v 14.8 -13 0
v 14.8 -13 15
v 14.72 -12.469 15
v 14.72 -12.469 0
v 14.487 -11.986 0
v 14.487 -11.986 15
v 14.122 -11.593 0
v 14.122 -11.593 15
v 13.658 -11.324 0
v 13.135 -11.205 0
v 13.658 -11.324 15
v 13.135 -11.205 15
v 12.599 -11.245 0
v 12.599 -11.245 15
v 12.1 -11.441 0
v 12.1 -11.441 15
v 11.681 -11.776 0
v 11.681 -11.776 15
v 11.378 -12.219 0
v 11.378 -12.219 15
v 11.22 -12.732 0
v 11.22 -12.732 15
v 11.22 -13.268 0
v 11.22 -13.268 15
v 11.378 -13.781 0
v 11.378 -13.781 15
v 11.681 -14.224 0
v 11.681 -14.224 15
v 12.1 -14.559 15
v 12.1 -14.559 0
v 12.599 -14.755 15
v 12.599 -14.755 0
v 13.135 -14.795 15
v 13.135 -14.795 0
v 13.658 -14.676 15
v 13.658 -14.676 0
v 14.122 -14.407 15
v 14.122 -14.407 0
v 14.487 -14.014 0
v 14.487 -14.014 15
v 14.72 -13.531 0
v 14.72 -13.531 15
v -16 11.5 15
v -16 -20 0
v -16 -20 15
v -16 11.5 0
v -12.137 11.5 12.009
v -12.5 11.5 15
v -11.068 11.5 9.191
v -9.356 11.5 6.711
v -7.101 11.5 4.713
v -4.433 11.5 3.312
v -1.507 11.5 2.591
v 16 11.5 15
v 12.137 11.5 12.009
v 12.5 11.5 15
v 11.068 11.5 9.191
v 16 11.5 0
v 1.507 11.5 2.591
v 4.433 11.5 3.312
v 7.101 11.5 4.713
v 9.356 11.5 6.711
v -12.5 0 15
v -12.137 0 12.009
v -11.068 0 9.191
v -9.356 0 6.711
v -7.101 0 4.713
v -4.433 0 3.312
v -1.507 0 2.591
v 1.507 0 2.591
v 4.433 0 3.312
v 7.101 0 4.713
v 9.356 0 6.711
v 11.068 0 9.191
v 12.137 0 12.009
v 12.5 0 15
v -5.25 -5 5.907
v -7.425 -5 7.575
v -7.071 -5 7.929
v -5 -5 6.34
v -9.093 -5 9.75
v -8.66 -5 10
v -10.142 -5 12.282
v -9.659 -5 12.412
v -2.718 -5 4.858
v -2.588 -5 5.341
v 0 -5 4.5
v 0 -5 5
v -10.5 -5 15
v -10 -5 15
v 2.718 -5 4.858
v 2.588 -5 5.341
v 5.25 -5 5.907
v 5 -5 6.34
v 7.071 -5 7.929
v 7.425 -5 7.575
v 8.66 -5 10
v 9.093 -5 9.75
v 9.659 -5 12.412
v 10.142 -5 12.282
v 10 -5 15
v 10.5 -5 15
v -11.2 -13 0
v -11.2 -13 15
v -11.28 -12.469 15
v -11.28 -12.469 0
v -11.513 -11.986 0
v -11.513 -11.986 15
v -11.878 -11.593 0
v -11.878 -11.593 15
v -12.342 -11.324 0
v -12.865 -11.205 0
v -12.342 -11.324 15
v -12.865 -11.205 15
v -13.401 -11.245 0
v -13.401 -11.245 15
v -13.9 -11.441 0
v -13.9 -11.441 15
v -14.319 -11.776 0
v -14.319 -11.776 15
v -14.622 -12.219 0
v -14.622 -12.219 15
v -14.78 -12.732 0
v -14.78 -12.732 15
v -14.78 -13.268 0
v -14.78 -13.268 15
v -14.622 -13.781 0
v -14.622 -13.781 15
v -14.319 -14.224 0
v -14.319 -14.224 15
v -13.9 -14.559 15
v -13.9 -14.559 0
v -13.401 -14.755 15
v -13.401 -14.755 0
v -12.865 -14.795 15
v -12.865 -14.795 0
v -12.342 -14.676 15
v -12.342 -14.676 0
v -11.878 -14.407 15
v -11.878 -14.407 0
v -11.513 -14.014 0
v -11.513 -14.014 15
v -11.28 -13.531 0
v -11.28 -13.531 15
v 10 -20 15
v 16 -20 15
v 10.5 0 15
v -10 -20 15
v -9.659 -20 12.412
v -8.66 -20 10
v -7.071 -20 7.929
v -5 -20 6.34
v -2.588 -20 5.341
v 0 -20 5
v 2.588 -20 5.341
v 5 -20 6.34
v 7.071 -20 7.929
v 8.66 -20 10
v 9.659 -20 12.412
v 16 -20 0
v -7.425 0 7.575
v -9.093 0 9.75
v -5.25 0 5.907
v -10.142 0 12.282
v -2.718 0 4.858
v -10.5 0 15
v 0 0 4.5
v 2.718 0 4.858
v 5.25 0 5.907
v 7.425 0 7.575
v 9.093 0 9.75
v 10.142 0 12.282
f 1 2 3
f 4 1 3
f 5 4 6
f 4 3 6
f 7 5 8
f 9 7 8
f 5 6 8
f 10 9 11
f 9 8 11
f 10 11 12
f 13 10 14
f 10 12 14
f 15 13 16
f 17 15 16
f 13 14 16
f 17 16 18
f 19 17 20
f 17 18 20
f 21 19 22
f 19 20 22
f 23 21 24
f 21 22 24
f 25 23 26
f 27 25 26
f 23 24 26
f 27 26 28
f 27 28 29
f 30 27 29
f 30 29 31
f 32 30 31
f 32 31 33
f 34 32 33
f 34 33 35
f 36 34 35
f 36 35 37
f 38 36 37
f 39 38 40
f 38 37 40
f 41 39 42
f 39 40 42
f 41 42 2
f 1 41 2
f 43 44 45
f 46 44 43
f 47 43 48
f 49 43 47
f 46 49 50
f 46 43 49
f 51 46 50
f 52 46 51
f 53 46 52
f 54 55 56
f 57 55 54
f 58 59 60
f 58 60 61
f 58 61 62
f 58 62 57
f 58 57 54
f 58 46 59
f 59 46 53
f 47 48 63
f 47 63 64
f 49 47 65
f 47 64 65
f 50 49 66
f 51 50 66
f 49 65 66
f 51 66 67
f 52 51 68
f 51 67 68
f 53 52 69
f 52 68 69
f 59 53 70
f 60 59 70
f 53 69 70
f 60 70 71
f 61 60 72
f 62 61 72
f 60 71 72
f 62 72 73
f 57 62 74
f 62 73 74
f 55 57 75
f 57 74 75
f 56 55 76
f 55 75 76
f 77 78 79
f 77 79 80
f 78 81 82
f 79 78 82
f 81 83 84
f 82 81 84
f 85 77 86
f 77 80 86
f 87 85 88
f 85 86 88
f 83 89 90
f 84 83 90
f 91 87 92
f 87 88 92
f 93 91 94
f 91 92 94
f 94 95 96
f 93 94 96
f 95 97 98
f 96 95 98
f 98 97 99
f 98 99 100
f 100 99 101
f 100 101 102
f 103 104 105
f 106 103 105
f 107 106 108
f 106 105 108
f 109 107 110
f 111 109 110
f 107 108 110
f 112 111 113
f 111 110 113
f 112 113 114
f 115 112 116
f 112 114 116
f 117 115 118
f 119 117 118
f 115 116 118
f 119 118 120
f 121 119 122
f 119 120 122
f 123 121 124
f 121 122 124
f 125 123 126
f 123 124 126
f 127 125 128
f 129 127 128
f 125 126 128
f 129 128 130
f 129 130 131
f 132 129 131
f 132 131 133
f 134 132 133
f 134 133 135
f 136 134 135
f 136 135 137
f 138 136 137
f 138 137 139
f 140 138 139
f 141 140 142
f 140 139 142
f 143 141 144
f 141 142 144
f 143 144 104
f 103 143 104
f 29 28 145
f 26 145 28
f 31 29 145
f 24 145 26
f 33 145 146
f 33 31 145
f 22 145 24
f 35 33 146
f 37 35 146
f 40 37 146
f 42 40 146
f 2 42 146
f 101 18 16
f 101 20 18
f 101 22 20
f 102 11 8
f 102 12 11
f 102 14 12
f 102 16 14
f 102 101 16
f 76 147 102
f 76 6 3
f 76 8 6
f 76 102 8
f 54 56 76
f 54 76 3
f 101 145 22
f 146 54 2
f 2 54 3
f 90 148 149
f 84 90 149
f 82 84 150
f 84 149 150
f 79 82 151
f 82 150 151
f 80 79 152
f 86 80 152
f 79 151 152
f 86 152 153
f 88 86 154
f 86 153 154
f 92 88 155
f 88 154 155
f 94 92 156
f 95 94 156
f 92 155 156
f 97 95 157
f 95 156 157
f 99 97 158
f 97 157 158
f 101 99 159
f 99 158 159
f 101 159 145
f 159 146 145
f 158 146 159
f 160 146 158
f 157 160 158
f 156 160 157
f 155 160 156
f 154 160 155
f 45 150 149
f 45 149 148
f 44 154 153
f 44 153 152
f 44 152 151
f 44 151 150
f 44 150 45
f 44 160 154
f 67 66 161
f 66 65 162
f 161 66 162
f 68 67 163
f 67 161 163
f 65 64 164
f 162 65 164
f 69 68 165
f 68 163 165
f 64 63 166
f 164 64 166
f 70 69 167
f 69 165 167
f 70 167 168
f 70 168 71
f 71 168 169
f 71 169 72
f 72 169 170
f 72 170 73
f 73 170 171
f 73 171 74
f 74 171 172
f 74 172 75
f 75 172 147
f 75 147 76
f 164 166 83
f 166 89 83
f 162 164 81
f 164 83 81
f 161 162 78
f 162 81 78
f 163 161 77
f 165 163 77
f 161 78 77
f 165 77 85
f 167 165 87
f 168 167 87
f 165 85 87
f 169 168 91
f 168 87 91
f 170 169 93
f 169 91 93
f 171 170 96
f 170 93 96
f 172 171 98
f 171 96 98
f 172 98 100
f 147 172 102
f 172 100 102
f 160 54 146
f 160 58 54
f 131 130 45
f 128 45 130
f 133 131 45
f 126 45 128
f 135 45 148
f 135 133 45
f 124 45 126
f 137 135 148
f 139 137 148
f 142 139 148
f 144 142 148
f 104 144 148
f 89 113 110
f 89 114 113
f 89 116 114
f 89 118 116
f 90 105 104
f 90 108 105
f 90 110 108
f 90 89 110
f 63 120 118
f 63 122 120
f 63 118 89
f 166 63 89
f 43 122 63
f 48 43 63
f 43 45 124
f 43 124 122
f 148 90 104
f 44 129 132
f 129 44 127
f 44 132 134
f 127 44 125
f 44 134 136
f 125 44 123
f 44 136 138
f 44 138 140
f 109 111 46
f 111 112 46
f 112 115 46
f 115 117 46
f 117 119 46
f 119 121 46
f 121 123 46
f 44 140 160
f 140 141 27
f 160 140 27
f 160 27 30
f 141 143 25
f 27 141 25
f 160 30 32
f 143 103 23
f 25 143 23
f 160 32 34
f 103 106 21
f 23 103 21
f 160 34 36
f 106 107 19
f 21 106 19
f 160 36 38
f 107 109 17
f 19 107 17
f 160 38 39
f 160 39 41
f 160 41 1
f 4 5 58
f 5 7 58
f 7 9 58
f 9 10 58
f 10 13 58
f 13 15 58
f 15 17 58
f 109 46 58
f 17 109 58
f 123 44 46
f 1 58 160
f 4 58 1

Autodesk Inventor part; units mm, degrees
ref_plane "YZ Plane" through (0, 0, 0) normal (1, 0, 0) x (0, 1, 0)
ref_plane "XZ Plane" through (0, 0, 0) normal (0, 1, 0) x (-1, 0, 0)
ref_plane "XY Plane" through (0, 0, 0) normal (0, 0, 1) x (1, 0, 0)
sketch "Skizze1" plane through (0, 0, 0) normal (0, 0, 1) x (1, 0, 0)
  line L0 (-16, 20) -> (16, 20)
  line L1 (16, 20) -> (16, -20)
  line L2 (16, -20) -> (-16, -20)
  line L3 (-16, -20) -> (-16, 20)
  line L4 (-16, 20) -> (16, -20) construction
  line L5 (16, 20) -> (-16, -20) construction
  point P0 (0, 0)
  dimension "d0" = 32
  dimension "d1" = 40
extrude "Extrusion1" add sketch "Skizze1" along normal blind 15
sketch "Skizze2" plane through (-16, -20, 0) normal (0, -1, 0) x (1, 0, 0)
  line L0 (0, 15) -> (32, 15) projected
  line L1 (0, 0) -> (0, 15) projected
  line L2 (32, 0) -> (0, 0) projected
  line L3 (32, 0) -> (32, 15) projected
  line L4 (32, 15) -> (0, 15) projected
  circle A0 centre (16, 15) radius 10
  point P0 (16, 0)
  dimension "d4" = 20
extrude "Extrusion2" cut sketch "Skizze2" against normal blind 15 contours A0 L0 | L0 A0
sketch "Skizze3" plane through (-16, -5, 0) normal (0, -1, 0) x (1, 0, 0)
  line L0 (0, 0) -> (0, 15) projected
  line L1 (32, 0) -> (0, 0) projected
  line L2 (32, 0) -> (32, 15) projected
  line L3 (26, 15) -> (32, 15) projected
  line L4 (0, 15) -> (6, 15) projected
  line L5 (6, 15) -> (26, 15) projected
  circle A0 centre (16, 15) radius 10.5
  point P0 (16, 0)
  dimension "d7" = 21
extrude "Extrusion3" cut sketch "Skizze3" against normal blind 5 contours A0 L3 L5 L4 | L4 L5 L3 A0
sketch "Skizze4" plane through (-16, 0, 0) normal (0, -1, 0) x (1, 0, 0)
  line L0 (5.5, 15) -> (26.5, 15) projected
  circle A0 centre (16, 15) radius 12.5
  point P0 (16, 0)
  dimension "d10" = 25
extrude "Extrusion4" cut sketch "Skizze4" against normal through all
sketch "Skizze5" plane through (0, 0, 15) normal (0, 0, 1) x (1, 0, 0)
  line L0 (-16, 20) -> (-16, -20) projected
  line L1 (-16, -20) -> (-10, -20) projected
  line L2 (-10, -20) -> (-10, -5) projected
  line L3 (10, -5) -> (10, -20) projected
  line L4 (10, -20) -> (16, -20) projected
  line L5 (16, -20) -> (16, 20) projected
  circle A0 centre (-13, -13) radius 1.8
  circle A1 centre (13, -13) radius 1.8
  point P0 (0, 0)
  dimension "d13" = 3.6
  dimension "d14" = 3.6
  dimension "d15" = 7
  dimension "d16" = 7
  dimension "d17" = 3
  dimension "d18" = 3
extrude "Extrusion5" cut sketch "Skizze5" against normal through all
sketch "Skizze6" plane through (0, 0, 0) normal (0, 0, -1) x (-1, 0, 0)
  line L0 (12.5, 20) -> (16, 20) projected
  line L1 (16, 20) -> (16, 11.5)
  line L2 (16, 20) -> (16, -20) projected
  line L3 (16, 11.5) -> (-16, 11.5)
  line L4 (-16, -20) -> (-16, 20) projected
  line L5 (-16, 20) -> (16, 20)
  point P0 (0, 0)
  dimension "d21" = 8.5
extrude "Extrusion6" cut sketch "Skizze6" against normal blind 22.5
properties part number "oberteil (1)"
